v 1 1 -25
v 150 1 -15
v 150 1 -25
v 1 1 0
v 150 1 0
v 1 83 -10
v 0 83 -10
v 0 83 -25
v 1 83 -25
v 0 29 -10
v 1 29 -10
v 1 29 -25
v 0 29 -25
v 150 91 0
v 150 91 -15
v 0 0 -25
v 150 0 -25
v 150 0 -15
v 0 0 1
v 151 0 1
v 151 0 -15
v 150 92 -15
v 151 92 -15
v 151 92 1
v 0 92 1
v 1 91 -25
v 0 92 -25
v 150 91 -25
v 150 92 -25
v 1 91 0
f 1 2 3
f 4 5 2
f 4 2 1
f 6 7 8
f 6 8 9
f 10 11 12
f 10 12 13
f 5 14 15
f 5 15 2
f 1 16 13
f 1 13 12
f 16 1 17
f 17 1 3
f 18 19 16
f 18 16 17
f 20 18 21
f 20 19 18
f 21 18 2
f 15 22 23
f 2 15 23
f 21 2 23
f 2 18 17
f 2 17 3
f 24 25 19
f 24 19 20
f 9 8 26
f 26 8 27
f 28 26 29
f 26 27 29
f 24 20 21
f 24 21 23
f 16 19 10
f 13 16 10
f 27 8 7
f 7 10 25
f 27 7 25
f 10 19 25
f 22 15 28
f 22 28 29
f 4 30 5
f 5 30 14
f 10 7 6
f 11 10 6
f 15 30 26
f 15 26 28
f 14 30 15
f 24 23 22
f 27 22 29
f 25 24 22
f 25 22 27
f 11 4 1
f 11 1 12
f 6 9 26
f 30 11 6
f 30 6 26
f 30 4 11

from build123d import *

# Parameters (mm, degrees)
F0_W     = 1
F0_H     = 54
F1_DEPTH = 1
F2_DEPTH = 25
F3_DEPTH = 10
F4_DEPTH = 15


with BuildPart() as f1:
    # F0 (on Top) → F1 (new body)
    with BuildSketch(Plane.XY):
        with Locations((0.5, 56)):
            Rectangle(F0_W, F0_H)
        Polygon((150, 1), (150, 0), (151, 0), (151, 92), (150, 92), (150, 91), align=None)
        Polygon((1, 1), (150, 1), (150, 91), (1, 91), (1, 83), (1, 29), align=None)
        Polygon((0, 92), (0, 83), (1, 83), (1, 91), (150, 91), (150, 92), align=None)
        Polygon((0, 29), (0, 0), (150, 0), (150, 1), (1, 1), (1, 29), align=None)
    extrude(amount=F1_DEPTH)

    # F0 (on Top) → F2 (join)
    with BuildSketch(Plane.XY):
        Polygon((0, 29), (0, 0), (150, 0), (150, 1), (1, 1), (1, 29), align=None)
        Polygon((0, 92), (0, 83), (1, 83), (1, 91), (150, 91), (150, 92), align=None)
    extrude(amount=-F2_DEPTH)

    # F0 (on Top) → F3 (join)
    with BuildSketch(Plane.XY):
        with Locations((0.5, 56)):
            Rectangle(F0_W, F0_H)
    extrude(amount=-F3_DEPTH)

    # F0 (on Top) → F4 (join)
    with BuildSketch(Plane.XY):
        Polygon((150, 1), (150, 0), (151, 0), (151, 92), (150, 92), (150, 91), align=None)
    extrude(amount=-F4_DEPTH)


solid = f1.part
